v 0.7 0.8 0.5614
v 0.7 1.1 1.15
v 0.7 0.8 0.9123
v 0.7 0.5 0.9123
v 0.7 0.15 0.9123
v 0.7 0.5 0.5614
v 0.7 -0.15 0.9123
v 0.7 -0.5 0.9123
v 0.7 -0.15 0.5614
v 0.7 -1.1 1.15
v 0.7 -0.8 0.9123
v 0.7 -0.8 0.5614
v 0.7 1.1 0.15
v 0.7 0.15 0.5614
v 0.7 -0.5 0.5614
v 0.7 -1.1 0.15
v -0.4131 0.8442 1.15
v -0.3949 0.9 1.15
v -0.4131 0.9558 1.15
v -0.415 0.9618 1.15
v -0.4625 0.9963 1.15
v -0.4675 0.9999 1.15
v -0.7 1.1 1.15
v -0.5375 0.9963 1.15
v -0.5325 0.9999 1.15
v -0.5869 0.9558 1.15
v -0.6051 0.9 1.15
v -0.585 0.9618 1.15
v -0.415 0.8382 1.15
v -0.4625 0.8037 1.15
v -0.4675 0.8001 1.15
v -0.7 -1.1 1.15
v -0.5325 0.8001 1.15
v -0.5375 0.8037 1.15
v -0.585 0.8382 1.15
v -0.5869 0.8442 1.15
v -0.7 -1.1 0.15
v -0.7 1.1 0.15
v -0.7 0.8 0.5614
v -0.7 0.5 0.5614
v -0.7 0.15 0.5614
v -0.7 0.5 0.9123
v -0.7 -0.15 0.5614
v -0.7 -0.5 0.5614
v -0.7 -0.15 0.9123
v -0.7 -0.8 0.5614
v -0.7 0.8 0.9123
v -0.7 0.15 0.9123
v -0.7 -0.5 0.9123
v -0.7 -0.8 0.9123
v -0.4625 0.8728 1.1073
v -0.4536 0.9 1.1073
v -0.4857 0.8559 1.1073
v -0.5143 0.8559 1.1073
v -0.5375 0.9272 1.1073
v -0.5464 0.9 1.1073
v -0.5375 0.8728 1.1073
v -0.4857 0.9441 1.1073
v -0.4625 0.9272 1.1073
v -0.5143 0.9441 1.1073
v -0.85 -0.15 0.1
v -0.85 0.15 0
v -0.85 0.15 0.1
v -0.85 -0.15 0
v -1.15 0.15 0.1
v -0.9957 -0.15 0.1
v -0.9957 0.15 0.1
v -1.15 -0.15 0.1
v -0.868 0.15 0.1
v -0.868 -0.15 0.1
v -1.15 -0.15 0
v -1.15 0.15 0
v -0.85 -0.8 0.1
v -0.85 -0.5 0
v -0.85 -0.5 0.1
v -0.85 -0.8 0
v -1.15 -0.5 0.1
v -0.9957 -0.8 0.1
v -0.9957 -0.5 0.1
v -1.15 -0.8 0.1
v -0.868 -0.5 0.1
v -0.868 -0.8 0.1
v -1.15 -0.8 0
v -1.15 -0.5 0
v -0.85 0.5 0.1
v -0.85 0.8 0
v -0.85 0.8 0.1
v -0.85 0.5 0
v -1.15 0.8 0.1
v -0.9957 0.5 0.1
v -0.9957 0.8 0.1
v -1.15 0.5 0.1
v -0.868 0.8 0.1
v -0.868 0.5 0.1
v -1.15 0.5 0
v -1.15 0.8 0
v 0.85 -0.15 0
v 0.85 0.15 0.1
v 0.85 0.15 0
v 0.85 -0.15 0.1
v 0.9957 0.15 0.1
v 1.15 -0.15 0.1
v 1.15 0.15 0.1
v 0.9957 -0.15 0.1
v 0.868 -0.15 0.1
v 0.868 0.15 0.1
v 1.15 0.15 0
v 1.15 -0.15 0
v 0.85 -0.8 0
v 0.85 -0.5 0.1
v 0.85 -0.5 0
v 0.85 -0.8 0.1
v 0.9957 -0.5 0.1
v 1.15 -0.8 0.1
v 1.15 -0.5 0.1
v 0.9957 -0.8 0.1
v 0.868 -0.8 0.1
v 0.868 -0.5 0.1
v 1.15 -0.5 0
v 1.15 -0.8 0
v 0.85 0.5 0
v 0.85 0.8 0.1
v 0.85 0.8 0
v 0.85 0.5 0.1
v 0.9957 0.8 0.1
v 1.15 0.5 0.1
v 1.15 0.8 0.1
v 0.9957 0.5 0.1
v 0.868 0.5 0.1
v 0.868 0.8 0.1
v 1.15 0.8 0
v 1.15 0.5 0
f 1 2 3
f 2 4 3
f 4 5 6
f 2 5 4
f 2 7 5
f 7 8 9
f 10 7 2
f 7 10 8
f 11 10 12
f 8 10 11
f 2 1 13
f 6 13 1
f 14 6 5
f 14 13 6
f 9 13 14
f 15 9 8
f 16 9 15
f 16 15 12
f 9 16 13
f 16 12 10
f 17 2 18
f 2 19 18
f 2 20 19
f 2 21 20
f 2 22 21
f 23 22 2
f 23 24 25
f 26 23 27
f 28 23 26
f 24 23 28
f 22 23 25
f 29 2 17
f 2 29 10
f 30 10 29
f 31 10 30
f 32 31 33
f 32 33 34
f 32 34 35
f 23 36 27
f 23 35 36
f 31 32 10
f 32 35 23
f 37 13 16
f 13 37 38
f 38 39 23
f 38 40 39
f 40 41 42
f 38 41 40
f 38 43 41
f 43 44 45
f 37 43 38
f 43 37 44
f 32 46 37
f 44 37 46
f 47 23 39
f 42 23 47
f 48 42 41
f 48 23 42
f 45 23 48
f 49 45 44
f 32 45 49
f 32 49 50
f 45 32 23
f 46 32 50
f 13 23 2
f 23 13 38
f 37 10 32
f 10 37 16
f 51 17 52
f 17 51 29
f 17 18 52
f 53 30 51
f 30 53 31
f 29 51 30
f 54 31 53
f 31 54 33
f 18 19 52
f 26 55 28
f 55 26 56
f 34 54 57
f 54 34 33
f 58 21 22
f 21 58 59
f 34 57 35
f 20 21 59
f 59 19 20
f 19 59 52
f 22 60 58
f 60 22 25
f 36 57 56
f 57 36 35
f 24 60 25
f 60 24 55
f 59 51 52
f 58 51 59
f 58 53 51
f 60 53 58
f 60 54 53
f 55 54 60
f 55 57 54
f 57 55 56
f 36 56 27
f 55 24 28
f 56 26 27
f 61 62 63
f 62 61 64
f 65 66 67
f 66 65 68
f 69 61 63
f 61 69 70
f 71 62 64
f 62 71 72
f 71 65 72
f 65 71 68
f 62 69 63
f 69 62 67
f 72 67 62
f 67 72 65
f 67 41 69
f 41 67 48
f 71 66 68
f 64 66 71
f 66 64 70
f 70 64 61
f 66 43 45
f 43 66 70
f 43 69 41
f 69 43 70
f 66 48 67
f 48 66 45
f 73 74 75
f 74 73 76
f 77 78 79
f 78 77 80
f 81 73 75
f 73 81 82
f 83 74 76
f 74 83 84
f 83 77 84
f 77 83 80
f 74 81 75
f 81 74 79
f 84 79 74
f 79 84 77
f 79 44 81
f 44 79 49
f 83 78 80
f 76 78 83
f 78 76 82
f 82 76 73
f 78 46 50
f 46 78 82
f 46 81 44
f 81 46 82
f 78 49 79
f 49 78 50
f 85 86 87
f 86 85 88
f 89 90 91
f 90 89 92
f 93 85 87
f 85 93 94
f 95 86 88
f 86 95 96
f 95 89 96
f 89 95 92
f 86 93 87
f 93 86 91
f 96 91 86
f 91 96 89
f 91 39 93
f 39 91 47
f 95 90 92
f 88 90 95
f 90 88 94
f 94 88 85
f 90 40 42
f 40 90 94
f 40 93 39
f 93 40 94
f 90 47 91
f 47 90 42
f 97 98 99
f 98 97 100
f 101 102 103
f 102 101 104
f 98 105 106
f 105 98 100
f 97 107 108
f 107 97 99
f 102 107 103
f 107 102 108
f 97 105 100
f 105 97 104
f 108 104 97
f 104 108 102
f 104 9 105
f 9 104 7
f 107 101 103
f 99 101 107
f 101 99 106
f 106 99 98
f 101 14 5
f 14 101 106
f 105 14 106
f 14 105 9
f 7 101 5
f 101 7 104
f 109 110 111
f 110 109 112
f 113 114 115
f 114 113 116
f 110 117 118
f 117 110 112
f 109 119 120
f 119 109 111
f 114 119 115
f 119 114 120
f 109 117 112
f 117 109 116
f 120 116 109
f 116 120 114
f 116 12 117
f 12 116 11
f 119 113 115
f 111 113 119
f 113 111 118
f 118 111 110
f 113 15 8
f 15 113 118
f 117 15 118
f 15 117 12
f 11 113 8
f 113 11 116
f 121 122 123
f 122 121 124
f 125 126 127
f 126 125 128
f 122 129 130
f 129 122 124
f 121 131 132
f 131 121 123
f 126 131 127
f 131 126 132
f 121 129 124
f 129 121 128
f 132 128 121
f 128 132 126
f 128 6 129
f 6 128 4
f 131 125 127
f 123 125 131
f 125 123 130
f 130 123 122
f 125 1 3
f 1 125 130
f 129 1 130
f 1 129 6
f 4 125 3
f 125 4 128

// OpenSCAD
/*
 * A generic SOT-363 packaged part.
 *
 * Author: Ian McInerney
 * Created: June 25, 2013
 *
 */

module pin() {
	translate([0.15,0.0,0.0])cube([0.3,0.30,0.10], center=true);
	translate([0.2,0.0,0.0])rotate([0.0,20,0.0])translate([0.0,0.0,0.45])cube([0.12,0.30,0.9], center=true);
}


// Assemble the main package and the pins
module main() {
		translate([0.0,0.0,0.65])cube([1.4,2.2,1.0], center=true);
}

// Add the marker for pin 1
difference() {
	// The main cube
	main();

	// The pin 1 marker
	translate([-0.5,0.9,1.25])sphere(r=0.15, $fn=10);
}

translate([-1.15,0.0,0.05])pin();
translate([-1.15,-0.65,0.05])pin();
translate([-1.15,0.65,0.05])pin();

translate([1.15,0.0,0.05])rotate([0.0,0.0,180])pin();
translate([1.15,-0.65,0.05])rotate([0.0,0.0,180])pin();
translate([1.15,0.65,0.05])rotate([0.0,0.0,180])pin();
